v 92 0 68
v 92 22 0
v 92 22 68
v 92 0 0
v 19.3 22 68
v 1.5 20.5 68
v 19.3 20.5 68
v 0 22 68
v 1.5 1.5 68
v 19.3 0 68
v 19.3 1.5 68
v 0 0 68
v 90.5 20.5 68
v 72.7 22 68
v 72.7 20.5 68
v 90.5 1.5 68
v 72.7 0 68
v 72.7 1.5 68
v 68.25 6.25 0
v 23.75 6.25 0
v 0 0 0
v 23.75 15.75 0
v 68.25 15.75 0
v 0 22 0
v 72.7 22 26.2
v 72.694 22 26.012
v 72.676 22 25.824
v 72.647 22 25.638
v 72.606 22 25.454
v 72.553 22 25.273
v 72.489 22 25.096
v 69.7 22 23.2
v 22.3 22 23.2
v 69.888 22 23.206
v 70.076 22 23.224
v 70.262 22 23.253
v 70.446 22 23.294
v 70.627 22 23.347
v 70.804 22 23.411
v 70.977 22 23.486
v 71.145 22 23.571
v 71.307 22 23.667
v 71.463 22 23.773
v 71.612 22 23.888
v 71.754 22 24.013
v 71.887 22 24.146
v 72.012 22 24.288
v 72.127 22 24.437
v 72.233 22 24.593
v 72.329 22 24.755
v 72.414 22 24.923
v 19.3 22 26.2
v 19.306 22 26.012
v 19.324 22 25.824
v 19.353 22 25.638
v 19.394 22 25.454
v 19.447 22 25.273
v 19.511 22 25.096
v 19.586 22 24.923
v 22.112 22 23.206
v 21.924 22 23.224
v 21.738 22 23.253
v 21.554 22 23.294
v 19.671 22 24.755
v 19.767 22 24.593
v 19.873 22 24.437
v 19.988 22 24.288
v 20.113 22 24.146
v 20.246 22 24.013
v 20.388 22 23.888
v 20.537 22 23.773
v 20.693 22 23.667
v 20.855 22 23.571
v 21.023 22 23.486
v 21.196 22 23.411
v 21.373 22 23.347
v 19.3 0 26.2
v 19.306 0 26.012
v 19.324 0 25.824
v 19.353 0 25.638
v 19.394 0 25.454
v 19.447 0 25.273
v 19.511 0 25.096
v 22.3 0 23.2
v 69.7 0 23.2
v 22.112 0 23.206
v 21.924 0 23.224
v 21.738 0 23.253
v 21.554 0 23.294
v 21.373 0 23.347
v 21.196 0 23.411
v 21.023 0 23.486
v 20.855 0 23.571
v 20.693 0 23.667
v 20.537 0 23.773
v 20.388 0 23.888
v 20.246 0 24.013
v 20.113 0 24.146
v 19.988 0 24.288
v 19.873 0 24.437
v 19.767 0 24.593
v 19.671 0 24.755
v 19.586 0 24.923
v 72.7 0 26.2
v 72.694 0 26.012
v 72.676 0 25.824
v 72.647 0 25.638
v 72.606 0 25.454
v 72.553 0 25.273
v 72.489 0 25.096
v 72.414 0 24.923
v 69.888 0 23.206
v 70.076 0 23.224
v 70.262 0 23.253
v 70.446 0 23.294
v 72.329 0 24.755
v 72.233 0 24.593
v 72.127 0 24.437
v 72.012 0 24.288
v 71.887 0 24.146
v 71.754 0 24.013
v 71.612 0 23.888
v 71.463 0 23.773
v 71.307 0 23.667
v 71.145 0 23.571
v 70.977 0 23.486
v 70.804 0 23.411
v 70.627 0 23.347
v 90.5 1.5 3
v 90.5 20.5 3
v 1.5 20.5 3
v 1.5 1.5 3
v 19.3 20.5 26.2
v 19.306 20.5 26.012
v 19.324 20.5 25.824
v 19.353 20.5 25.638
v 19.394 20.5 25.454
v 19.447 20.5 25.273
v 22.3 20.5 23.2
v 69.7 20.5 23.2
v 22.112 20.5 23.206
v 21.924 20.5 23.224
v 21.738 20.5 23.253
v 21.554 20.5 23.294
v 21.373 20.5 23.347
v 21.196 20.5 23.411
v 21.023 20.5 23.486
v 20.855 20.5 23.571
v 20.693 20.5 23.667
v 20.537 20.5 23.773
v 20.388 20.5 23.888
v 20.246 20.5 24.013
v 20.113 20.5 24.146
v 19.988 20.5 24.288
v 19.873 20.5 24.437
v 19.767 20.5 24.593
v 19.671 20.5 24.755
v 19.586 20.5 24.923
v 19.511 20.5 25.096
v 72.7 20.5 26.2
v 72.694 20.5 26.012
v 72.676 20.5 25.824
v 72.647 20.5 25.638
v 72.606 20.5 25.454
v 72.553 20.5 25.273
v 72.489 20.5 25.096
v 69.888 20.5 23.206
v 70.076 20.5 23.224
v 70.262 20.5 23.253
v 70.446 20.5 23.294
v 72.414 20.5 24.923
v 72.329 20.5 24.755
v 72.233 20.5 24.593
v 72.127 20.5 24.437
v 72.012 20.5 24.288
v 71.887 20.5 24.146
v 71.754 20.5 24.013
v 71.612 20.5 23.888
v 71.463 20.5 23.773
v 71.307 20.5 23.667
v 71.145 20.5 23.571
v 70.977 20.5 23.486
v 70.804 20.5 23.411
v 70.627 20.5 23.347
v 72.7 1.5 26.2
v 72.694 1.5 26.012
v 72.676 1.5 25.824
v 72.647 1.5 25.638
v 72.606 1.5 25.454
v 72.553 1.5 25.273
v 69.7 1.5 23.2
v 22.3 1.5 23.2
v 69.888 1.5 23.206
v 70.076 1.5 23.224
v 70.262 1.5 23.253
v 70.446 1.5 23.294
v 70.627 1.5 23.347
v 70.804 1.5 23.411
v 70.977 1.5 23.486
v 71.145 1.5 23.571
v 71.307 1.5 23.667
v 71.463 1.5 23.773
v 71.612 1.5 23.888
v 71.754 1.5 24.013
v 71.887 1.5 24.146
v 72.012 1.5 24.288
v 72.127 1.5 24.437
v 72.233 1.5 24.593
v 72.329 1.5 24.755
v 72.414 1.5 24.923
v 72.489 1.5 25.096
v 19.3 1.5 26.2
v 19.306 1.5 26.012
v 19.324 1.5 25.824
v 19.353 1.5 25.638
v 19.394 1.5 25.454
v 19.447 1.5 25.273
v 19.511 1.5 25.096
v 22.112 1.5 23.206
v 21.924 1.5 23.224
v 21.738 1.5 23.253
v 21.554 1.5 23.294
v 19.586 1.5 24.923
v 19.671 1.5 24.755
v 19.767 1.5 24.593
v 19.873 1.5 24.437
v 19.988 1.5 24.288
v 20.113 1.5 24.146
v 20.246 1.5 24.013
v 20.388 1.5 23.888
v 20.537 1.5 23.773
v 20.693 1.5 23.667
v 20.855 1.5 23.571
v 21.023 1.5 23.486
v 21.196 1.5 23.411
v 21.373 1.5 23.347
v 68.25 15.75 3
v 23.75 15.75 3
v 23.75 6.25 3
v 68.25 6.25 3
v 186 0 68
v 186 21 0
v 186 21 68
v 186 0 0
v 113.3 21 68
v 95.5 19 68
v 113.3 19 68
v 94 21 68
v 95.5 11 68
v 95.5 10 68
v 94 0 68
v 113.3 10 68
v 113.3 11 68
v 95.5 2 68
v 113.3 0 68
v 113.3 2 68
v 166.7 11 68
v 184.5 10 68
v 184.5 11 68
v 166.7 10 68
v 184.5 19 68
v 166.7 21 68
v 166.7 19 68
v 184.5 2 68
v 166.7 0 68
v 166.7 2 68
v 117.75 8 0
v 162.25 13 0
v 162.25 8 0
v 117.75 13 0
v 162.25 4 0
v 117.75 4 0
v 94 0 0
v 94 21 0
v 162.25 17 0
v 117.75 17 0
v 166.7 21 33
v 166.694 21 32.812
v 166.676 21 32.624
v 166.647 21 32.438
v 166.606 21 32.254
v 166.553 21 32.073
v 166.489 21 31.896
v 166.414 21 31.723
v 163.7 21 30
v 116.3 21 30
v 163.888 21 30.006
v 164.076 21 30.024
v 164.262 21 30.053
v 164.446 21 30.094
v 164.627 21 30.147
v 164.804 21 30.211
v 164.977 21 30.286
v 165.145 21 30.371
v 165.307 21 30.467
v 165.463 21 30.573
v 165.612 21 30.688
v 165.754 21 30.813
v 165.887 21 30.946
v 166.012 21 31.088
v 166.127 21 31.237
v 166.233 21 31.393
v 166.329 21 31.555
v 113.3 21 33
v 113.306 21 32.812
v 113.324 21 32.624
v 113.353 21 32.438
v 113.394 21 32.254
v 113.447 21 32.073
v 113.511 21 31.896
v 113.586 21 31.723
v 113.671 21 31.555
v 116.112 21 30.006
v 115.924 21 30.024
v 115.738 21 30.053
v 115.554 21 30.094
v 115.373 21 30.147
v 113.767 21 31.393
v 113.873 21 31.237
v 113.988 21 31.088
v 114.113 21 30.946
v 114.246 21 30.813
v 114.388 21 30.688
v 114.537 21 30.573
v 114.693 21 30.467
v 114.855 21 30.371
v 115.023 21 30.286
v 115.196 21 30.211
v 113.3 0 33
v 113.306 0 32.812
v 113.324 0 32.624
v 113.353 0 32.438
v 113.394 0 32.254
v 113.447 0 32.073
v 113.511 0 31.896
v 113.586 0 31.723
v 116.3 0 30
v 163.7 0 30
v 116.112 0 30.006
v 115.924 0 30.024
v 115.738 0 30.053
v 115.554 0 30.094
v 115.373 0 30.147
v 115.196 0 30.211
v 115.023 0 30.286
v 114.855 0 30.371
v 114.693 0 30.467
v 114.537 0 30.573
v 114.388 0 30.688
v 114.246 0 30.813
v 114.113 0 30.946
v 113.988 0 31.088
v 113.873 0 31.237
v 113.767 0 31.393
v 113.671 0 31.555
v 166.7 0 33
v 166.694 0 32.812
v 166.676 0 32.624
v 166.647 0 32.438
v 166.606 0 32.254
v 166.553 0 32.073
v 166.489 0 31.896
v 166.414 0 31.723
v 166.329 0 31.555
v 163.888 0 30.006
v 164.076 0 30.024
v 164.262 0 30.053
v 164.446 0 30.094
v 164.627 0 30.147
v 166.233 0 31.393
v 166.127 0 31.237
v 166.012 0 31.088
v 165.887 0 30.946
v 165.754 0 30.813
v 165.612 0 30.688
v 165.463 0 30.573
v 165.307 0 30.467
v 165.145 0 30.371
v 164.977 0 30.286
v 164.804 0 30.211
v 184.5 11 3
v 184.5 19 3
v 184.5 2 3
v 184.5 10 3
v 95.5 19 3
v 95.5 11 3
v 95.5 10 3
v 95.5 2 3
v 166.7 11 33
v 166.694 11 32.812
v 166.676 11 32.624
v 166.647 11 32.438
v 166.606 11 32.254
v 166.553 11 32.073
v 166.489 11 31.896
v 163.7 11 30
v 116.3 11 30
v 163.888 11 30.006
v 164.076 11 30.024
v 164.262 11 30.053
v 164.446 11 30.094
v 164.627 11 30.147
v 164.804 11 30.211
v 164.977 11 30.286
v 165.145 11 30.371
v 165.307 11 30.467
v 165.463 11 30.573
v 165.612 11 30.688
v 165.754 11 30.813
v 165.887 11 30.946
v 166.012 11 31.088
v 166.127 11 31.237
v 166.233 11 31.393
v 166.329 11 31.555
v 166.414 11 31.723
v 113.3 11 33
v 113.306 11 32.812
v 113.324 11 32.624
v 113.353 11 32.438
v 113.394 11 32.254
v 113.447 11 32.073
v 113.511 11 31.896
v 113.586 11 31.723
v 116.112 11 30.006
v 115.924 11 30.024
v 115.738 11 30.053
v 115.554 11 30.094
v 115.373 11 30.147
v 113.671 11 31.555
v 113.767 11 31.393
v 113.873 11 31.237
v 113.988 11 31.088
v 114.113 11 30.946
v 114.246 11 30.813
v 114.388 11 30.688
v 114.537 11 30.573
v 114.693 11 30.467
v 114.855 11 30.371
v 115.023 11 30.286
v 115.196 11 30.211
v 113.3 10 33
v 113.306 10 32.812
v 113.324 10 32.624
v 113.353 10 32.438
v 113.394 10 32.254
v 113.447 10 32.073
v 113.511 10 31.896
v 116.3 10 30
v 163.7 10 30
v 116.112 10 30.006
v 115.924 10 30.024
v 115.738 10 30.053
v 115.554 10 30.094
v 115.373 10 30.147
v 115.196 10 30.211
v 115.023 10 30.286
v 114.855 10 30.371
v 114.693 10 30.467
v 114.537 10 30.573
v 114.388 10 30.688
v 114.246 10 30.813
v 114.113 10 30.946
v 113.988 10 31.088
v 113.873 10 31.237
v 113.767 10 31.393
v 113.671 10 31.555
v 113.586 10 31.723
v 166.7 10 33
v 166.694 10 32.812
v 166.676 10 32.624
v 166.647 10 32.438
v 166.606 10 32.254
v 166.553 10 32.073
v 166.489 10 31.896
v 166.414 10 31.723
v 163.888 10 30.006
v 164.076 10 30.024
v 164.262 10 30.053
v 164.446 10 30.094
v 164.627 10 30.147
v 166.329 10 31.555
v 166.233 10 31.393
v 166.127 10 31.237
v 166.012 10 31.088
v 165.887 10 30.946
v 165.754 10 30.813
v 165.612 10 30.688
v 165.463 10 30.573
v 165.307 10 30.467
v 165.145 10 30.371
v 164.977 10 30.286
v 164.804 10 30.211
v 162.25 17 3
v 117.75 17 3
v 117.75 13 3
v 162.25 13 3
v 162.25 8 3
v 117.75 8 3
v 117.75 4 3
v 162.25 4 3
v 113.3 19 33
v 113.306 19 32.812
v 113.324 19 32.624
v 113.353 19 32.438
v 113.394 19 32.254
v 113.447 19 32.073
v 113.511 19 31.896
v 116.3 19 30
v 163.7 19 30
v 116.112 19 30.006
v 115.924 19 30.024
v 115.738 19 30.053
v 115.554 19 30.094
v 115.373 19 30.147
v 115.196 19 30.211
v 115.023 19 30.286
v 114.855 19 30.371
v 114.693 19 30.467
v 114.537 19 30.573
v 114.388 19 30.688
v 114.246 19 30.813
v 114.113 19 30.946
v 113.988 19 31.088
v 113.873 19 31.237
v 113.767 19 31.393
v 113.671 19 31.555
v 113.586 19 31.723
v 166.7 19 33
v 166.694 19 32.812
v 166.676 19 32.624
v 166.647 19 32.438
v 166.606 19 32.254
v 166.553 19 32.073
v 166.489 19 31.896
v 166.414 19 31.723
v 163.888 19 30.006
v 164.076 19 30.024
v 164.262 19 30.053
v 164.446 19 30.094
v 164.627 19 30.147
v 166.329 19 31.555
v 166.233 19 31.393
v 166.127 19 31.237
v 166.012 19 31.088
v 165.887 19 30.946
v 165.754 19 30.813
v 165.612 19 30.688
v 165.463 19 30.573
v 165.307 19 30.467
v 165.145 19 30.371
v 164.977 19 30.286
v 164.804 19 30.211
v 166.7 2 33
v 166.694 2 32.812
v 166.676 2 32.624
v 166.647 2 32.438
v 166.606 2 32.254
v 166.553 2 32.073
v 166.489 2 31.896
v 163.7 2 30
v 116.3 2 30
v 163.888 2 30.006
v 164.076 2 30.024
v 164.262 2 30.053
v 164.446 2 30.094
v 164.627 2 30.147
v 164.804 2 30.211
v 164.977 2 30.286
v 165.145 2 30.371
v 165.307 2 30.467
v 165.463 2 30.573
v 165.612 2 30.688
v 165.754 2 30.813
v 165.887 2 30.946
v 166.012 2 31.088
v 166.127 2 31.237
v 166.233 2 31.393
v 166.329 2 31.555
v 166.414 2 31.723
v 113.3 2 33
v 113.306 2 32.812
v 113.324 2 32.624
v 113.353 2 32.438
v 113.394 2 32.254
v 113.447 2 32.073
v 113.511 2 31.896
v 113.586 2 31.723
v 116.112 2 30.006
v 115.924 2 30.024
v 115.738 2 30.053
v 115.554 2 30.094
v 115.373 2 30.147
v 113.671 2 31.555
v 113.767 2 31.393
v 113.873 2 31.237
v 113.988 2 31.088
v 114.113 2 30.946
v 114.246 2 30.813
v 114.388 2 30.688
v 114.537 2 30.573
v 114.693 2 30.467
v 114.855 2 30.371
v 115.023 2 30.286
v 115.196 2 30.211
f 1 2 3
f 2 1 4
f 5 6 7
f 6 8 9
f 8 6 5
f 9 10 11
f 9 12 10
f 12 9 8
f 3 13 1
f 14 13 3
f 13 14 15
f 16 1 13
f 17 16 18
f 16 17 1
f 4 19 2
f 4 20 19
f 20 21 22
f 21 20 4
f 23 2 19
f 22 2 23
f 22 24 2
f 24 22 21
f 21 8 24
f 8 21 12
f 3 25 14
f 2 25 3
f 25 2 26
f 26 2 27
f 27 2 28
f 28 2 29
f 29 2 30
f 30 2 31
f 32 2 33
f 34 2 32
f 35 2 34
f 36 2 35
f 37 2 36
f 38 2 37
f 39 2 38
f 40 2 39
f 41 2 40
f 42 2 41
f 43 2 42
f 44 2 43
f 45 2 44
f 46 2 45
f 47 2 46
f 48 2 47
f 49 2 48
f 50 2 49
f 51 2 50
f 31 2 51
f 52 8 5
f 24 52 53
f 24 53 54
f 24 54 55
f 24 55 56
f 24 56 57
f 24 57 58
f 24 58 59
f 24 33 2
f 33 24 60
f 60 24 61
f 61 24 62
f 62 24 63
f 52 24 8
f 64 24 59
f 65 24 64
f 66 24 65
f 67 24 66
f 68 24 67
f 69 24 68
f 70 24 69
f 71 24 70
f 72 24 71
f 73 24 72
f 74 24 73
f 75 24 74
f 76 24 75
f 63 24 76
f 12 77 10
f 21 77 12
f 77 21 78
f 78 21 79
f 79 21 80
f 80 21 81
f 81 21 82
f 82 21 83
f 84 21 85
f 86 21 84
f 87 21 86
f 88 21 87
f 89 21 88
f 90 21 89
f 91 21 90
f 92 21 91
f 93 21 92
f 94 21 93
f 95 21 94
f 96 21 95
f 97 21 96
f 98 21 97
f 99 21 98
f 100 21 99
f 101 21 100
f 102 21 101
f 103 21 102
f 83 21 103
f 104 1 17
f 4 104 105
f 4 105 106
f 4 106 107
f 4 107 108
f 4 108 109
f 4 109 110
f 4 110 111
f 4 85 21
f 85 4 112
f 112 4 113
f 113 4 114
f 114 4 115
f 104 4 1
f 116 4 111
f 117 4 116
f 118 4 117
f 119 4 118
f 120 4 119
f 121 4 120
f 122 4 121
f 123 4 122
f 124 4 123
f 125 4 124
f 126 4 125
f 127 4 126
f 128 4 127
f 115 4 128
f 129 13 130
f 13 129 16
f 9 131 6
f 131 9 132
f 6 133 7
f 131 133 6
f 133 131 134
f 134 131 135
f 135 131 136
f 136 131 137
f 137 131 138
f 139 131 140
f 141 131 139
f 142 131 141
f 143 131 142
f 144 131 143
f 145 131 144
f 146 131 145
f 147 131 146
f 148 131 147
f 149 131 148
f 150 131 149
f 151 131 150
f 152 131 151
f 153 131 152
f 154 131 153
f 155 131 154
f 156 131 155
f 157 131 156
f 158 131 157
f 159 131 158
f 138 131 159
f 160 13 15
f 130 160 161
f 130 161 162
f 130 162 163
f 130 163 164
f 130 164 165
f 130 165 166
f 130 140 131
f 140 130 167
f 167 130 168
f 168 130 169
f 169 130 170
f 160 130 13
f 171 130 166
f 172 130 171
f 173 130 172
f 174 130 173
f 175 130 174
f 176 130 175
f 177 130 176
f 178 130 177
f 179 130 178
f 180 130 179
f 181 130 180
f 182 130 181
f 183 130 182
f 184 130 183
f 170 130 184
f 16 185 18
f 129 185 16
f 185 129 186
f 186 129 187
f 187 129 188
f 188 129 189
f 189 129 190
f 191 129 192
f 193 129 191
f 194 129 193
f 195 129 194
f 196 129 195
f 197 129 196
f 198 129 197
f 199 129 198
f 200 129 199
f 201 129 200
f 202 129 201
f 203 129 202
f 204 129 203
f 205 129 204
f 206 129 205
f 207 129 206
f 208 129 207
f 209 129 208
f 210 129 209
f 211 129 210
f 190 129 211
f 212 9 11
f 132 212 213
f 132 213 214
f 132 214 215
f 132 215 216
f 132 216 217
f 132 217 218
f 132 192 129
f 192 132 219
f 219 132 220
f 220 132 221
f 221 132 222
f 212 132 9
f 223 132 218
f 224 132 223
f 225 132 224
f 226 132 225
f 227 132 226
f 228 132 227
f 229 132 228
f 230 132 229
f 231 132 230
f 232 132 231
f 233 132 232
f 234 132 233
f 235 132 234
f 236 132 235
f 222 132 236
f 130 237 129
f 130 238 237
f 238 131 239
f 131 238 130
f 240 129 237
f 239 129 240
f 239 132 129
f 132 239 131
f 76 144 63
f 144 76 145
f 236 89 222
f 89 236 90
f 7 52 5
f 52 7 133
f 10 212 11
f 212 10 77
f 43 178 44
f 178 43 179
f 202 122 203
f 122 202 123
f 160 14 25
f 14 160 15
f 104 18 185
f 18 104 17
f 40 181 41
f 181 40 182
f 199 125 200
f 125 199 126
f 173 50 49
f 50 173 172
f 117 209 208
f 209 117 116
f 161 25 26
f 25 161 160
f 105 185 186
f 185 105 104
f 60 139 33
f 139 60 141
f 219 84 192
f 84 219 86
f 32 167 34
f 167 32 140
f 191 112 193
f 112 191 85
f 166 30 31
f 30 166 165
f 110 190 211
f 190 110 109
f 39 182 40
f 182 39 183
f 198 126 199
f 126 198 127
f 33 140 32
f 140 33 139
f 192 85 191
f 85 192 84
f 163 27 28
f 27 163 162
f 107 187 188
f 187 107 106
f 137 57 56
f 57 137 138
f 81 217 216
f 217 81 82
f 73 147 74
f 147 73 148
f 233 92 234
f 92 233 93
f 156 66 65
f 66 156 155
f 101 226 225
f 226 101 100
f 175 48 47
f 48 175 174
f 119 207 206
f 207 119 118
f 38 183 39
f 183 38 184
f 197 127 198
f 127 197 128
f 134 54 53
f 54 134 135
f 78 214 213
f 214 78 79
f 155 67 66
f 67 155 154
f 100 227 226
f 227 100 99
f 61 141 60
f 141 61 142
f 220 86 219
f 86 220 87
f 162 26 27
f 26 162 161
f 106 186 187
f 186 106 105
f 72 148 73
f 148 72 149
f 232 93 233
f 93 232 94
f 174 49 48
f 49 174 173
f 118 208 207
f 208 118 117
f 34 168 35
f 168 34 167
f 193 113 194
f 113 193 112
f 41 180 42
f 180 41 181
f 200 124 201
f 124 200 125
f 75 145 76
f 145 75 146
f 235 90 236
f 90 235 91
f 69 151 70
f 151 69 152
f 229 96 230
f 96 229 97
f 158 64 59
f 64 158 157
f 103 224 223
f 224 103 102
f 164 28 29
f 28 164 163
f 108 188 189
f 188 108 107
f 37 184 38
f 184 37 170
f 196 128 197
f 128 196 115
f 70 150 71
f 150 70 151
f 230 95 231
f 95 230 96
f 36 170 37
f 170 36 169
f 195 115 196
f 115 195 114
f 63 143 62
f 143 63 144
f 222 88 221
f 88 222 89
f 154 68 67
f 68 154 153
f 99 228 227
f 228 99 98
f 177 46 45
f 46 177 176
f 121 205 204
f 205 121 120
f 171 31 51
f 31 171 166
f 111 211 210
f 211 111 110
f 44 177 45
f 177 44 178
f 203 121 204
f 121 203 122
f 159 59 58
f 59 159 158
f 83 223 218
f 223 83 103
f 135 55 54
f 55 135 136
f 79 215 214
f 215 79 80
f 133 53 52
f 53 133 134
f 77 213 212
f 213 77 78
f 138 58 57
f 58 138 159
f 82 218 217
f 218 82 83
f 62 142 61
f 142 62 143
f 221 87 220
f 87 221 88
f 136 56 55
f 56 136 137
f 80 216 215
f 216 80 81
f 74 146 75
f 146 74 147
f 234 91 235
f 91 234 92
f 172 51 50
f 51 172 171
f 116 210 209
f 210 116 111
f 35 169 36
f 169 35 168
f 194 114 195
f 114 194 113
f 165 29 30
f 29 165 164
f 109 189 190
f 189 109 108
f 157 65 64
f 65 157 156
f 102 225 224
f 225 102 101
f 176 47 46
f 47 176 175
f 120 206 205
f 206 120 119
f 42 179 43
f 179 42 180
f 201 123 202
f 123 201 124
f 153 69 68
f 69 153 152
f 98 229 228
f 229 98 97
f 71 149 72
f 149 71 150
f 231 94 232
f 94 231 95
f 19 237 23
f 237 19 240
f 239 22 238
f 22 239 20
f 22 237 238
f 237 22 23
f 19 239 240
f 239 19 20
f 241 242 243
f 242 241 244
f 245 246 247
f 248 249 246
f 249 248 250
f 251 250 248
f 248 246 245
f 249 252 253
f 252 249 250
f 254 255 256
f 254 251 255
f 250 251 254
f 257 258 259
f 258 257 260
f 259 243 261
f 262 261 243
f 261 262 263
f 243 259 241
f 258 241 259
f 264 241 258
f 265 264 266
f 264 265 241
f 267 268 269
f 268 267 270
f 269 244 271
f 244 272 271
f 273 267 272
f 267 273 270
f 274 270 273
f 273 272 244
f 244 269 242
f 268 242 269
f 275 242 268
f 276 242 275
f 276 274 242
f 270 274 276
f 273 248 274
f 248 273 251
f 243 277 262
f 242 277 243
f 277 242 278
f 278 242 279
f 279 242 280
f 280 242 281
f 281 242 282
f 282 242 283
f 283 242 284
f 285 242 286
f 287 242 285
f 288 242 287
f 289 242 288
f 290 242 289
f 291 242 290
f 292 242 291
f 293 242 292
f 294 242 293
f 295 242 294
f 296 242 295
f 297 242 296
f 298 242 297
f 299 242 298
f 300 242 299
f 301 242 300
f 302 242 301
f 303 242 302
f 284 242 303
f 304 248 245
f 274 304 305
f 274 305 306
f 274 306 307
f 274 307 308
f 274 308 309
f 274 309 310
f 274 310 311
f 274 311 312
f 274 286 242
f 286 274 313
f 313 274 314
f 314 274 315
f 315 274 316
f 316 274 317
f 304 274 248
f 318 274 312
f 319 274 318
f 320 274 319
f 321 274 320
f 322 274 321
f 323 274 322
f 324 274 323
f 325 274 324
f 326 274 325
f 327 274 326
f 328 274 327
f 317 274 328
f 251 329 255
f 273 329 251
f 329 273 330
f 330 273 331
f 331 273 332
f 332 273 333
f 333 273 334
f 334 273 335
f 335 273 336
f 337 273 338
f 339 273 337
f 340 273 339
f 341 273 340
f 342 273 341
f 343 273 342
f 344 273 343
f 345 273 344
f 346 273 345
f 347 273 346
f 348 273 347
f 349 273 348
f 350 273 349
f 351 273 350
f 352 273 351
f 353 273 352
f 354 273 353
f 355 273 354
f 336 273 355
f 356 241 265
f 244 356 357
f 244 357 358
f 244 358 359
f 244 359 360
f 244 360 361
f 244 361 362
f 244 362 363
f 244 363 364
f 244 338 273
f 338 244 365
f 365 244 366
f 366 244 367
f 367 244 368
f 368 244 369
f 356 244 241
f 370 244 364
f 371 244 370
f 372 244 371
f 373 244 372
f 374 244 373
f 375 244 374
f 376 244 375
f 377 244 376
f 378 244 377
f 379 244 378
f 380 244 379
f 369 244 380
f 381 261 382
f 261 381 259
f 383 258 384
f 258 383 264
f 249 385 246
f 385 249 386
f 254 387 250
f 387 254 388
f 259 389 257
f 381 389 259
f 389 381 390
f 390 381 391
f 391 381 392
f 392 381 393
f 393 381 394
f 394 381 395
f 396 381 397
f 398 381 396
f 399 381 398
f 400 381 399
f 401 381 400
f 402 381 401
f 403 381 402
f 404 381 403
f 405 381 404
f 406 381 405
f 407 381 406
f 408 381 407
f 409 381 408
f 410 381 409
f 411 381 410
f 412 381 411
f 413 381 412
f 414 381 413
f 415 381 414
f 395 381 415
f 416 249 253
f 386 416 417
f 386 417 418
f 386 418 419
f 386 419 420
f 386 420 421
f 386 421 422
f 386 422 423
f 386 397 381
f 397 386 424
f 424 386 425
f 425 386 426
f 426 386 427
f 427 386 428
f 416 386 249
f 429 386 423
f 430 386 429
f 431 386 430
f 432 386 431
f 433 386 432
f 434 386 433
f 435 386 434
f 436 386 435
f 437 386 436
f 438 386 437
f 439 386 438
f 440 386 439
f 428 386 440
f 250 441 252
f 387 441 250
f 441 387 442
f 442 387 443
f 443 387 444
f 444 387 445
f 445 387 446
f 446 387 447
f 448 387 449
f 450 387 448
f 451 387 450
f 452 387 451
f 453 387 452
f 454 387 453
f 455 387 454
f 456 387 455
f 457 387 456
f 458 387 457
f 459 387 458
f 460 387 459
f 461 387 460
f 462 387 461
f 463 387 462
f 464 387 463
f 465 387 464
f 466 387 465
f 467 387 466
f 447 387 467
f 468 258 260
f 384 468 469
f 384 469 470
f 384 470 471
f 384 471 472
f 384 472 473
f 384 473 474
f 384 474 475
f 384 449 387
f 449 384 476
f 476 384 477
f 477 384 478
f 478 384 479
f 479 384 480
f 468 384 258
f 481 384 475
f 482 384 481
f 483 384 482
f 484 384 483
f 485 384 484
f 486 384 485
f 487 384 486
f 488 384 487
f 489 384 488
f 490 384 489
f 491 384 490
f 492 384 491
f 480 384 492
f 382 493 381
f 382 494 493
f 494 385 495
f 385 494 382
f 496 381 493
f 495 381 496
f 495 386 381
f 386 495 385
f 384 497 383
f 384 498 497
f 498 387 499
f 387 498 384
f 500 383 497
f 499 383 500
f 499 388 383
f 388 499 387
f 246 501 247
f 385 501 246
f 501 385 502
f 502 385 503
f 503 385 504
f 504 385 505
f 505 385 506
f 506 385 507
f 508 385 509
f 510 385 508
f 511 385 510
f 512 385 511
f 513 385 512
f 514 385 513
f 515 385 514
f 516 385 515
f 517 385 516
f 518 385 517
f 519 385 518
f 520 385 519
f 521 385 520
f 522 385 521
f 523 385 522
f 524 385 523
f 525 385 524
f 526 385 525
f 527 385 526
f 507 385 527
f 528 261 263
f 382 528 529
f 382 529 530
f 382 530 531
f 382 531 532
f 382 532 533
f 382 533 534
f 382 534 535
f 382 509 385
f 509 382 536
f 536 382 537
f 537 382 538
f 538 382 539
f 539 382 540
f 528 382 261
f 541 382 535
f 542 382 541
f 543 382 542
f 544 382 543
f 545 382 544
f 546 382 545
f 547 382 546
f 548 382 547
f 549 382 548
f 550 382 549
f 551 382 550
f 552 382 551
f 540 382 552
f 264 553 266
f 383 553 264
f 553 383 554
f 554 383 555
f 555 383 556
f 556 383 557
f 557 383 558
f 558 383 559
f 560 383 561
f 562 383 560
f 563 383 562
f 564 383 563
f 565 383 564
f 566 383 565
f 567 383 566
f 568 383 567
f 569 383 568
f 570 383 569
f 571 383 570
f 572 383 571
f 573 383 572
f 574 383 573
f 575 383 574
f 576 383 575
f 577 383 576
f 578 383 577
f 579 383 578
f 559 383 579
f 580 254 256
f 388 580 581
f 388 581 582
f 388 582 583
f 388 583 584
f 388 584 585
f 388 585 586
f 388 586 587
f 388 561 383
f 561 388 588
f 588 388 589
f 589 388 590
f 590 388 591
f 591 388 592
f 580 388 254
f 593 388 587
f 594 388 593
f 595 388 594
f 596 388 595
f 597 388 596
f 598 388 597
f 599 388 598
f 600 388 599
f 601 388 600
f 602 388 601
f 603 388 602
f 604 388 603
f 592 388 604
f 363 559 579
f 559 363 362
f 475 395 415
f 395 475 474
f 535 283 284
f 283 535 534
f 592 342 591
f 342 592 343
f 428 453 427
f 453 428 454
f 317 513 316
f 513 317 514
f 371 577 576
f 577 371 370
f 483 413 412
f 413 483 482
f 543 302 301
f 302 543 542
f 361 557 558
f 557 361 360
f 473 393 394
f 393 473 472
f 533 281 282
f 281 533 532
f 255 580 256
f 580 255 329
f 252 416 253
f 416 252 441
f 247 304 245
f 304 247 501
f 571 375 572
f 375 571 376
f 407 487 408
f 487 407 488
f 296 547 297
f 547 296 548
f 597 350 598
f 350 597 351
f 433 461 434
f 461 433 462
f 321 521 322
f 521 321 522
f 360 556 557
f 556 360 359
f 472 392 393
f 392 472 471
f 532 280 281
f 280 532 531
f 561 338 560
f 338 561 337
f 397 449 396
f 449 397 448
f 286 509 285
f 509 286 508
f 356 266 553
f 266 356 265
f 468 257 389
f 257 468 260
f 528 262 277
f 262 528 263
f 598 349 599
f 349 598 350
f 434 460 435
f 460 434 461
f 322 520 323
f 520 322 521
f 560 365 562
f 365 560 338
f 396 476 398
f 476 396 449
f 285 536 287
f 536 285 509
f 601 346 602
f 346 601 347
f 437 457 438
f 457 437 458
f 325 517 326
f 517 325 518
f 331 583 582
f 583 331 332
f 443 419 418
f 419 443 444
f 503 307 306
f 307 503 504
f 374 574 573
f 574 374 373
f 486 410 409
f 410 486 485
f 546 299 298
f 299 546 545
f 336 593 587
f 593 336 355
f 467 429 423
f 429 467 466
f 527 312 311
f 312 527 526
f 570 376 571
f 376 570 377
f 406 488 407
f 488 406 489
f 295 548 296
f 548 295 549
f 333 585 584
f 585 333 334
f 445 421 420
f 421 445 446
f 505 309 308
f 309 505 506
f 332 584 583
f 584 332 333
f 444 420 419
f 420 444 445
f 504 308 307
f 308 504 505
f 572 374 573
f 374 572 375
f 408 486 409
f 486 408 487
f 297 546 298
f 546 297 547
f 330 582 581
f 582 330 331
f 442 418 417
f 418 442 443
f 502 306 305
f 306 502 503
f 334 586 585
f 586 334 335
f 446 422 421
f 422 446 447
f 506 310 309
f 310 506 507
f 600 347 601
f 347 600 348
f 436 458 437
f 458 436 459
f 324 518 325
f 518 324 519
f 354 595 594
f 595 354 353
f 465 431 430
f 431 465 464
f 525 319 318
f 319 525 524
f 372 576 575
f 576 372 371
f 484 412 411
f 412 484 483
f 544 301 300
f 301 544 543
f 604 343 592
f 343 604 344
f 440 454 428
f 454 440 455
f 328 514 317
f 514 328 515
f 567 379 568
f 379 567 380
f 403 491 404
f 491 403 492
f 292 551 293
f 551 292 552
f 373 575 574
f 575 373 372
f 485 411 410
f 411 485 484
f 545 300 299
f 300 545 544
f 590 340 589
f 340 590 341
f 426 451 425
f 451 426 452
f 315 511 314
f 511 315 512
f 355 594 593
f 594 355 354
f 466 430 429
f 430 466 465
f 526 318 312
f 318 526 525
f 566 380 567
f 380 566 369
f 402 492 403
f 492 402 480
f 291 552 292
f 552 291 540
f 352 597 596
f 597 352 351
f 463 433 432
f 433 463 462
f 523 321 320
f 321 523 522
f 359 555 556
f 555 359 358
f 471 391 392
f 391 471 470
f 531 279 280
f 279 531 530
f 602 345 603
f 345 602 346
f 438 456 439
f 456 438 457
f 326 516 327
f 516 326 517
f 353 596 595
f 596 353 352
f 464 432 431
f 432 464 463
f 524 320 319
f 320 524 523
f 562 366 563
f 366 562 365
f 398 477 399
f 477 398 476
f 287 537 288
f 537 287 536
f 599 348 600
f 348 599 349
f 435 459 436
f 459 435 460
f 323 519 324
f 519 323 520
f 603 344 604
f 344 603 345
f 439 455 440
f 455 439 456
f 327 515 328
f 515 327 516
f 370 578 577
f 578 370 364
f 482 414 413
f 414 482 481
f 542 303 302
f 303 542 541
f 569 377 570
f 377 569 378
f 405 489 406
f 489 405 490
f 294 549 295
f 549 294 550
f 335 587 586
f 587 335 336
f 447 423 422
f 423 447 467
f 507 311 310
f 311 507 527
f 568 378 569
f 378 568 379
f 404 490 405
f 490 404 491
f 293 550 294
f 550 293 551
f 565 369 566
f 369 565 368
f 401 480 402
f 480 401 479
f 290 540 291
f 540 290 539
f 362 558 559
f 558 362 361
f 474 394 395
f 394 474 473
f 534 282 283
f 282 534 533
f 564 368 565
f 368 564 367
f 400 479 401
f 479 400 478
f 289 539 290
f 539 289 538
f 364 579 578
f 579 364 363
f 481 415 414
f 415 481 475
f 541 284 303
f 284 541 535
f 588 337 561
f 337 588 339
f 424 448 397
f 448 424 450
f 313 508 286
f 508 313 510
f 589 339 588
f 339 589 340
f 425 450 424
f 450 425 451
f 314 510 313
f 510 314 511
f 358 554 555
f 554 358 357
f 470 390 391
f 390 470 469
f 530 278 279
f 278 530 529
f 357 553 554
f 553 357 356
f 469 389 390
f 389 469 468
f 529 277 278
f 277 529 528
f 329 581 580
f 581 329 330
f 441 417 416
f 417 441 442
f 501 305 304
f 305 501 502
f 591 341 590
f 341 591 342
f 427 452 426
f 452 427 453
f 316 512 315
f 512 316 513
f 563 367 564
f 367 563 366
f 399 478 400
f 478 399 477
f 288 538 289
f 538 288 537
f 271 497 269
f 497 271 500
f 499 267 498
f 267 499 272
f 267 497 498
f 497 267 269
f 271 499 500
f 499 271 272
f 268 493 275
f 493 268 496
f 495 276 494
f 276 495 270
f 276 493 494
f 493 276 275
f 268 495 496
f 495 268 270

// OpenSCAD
include <../lib/boardgame_insert_toolkit_lib.2.scad>;

// determines whether lids are output.
g_b_print_lid = true;

// determines whether boxes are output.
g_b_print_box = true; 

// Focus on one box
g_isolated_print_box = ""; 

// Used to visualize how all of the boxes fit together. 
g_b_visualization = false;          
        
// this is the outer wall thickness. 
//Default = 1.5mm
g_wall_thickness = 1.5;

// The tolerance value is extra space put between planes of the lid and box that fit together.
// Increase the tolerance to loosen the fit and decrease it to tighten it.
//
// Note that the tolerance is applied exclusively to the lid.
// So if the lid is too tight or too loose, change this value ( up for looser fit, down for tighter fit ) and 
// you only need to reprint the lid.
// 
// The exception is the stackable box, where the bottom of the box is the lid of the box below,
// in which case the tolerance also affects that box bottom.
//
g_tolerance = 0.15;

// This adjusts the position of the lid detents downward. 
// The larger the value, the bigger the gap between the lid and the box.
g_tolerance_detents_pos = 0.1;

// This determines whether the default single material version is output, or, if printing in multiple materials, 
// which layer to output.
//
g_print_mmu_layer = "default"; // [ "default" | "mmu_box_layer" | "mmu_label_layer" ]

data =
[


    [   "card tray - missions",
        [
            [ BOX_SIZE_XYZ,[92.0, 22.0, 68.0] ],
            [ BOX_NO_LID_B,
                [
                    [ ],
                ]
            ],
            [ BOX_COMPONENT,
                [
                    [ CMP_SHAPE, SQUARE ],
                    [ CMP_COMPARTMENT_SIZE_XYZ, [ 89, 19, 65.0] ],
                    [ CMP_CUTOUT_SIDES_4B, [t,t,f,f]],
                    [ CMP_CUTOUT_HEIGHT_PCT, 60 ],
                    [ CMP_CUTOUT_WIDTH_PCT, 60 ],
                    [ CMP_CUTOUT_TYPE, BOTH ],
                    [ CMP_CUTOUT_BOTTOM_B, t ],
                    [ CMP_CUTOUT_BOTTOM_PCT, 50 ],
                ]
            ],

        ]
    ],
    [   "card tray - omega, ereigniskarten, solo",
        [
            [ BOX_SIZE_XYZ,[92.0, 21.0, 68.0] ],
            [ BOX_NO_LID_B,
                [
                    [ ],
                ]
            ],
            [ BOX_COMPONENT,
                [
                    [ CMP_SHAPE, SQUARE ],
                    [ CMP_NUM_COMPARTMENTS_XY, [1, 2] ],
                    [ CMP_COMPARTMENT_SIZE_XYZ, [ 89, 8, 65.0] ],
                    [ CMP_CUTOUT_SIDES_4B, [t,t,f,f]],
                    [ CMP_CUTOUT_HEIGHT_PCT, 50 ],
                    [ CMP_CUTOUT_WIDTH_PCT, 60 ],
                    [ CMP_CUTOUT_TYPE, BOTH ],
                    [ CMP_CUTOUT_BOTTOM_B, t ],
                    [ CMP_CUTOUT_BOTTOM_PCT, 50 ],
                ]
            ],

        ]
    ],
];


MakeAll();
